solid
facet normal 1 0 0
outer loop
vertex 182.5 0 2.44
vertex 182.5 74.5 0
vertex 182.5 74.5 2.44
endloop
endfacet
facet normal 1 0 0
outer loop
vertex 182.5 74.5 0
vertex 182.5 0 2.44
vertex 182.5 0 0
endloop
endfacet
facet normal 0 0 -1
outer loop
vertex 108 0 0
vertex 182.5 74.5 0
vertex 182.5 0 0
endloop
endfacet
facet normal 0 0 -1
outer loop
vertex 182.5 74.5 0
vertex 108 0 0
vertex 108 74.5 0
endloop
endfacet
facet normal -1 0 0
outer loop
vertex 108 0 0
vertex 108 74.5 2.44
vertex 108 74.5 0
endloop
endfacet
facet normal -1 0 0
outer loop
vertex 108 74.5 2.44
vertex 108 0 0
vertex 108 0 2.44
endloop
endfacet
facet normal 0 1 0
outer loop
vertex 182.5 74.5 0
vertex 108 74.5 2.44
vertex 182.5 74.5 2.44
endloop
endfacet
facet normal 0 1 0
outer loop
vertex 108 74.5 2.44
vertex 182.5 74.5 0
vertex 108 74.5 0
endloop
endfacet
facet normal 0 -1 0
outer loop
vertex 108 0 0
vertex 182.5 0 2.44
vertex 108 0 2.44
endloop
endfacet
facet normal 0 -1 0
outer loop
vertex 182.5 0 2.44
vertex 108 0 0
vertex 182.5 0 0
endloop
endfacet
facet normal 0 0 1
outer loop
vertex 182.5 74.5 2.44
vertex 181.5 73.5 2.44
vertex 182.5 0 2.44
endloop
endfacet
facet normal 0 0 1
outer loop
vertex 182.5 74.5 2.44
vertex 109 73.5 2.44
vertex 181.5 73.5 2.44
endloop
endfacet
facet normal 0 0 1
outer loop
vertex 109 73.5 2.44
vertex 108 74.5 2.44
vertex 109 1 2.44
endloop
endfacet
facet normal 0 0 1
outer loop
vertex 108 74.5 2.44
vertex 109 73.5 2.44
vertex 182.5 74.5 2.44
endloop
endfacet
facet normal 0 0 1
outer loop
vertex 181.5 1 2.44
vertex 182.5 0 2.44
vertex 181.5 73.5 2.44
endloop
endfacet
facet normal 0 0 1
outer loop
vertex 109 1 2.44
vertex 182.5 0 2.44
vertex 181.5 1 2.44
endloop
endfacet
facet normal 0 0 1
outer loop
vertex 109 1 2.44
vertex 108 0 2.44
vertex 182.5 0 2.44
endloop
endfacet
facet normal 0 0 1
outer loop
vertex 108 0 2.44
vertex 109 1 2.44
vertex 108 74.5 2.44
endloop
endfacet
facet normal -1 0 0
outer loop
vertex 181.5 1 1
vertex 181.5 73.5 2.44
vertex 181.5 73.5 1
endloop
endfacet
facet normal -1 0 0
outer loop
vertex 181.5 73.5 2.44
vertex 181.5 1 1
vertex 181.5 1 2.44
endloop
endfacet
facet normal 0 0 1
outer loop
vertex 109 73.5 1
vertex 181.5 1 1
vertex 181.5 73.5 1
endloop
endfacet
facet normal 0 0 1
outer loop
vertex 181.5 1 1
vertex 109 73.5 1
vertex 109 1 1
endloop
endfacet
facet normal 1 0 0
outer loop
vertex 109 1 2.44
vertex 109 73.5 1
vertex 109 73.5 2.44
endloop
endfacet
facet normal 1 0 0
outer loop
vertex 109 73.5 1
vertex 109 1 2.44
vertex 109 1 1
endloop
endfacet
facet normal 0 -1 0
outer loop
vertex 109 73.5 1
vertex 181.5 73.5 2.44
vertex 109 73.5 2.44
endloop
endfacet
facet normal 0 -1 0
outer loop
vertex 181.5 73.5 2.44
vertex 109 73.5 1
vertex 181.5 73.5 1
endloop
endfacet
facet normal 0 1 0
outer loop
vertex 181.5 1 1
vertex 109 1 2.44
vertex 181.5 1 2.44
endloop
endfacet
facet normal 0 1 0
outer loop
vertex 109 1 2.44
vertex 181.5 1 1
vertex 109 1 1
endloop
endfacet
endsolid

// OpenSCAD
//include <lib/simple_box.scad>;
//x();
//i = 10;

////****MAIN SETTINGS****///////////////////////////////////////////////////////////////////////////
//////////////////////////////

//quality
$fn = 32;

create_lid = 1; //0 - don't create lid;   1 - create lid
create_body = 0; //0 - don't create body; 1 - create body

body_size_x = 72; //size of box in milimeters(openSCAD is unitless, so scale if needed)
body_size_y = 72; //internal space of the box will be: size - wall_thickness*2
body_size_z = 72;

wall_thickness = 1; //wall thickness in mm


roundness = 0; //roundness of the box in mm

//0 - sphere
//1 - z axis cylinder
//2 - x axis cylinder
//3 - y axis cylinder
roundness_type = 0;

//create latch flag
create_latches = 0;

////////////////////////////////////////////////////////////////////////////////////////////////////
////****INTERNAL SECTIONS****///////////////////////////////////////////////////////////////////////
////////////////////////////////////////////////////////////////////////////////////////////////////

internal_sections_thickness = 2; //internal sections thickness

internal_sections = [
                    //relative        | angle        | length  |relative |
                    //coordinates     | around z     | of the  | height  |
                    //of the middle   | (by default  | section |         |
                    //of the section  | sections are |         |         |
                    //                | alligned     |         |         |
                    //                | with x)      |         |         |
                    //  [ [0.5, 0.5],   90,             70,        1],
                    //  [ [0.7, 0.7],   10 ,             10,       0.5 ]
                    ];

////////////////////////////////////////////////////////////////////////////////////////////////////
////****ADVANCED SETTINGS****///////////////////////////////////////////////////////////////////////
////////////////////////////////////////////////////////////////////////////////////////////////////

//z size of the lid in relation to the body
lid_size_ratio = 0.02;

//horizontal gap between body and lid in mm
lid_gap = 0.50;

//box type 0 properties
body_roundness_reducer_multiplyer = 1;

//latch dimensions
latch_height = 0.5;
latch_width = 2;

////////////////////////////////////////////////////////////////////////////////////////////////////
////****PRE CALCULATIONS****/////////////////////////////////////////////////////////////////////////
////////////////////////////////////////////////////////////////////////////////////////////////////
body_internal_size_x = body_size_x - wall_thickness*2;
body_internal_size_y = body_size_y - wall_thickness*2;
body_internal_size_z = body_size_z - wall_thickness;

main_body_internal_center = [body_internal_size_x/2.0,
                             body_internal_size_y/2.0,
                             body_internal_size_z/2.0];
                             
lid_wall_height = body_size_z*lid_size_ratio;

lid_size_x = body_size_x + wall_thickness*2 + lid_gap;
lid_size_y = body_size_y + wall_thickness*2 + lid_gap;
lid_size_z = lid_wall_height + roundness + wall_thickness;

//latch
body_latch_z = body_size_z - (lid_wall_height)/2.0 + latch_width/4.0;
body_latch_x = (body_size_x- roundness*2)/2.0;
body_latch_y = (body_size_y- roundness*2)/2.0;

lid_latch_z = (roundness + wall_thickness) + (lid_wall_height)/2.0 + latch_width/4.0;
lid_latch_x = body_latch_x;
lid_latch_y = body_latch_y;
////////////////////////////////////////////////////////////////////////////////////////////////////
////****SPACES****//////////////////////////////////////////////////////////////////////////////////
////////////////////////////////////////////////////////////////////////////////////////////////////

module main_body_space(){
    translate([wall_thickness+lid_gap, wall_thickness+lid_gap, 0]){
        children();
    }
}

module lid_space(){
    translate([(body_size_x)*1.5, 0, 0]){
        children();
    }
}

module main_body_internal_space(){
    main_body_space(){
        translate([wall_thickness, wall_thickness, wall_thickness]){
            children();
        }
    }
}

////////////////////////////////////////////////////////////////////////////////////////////////////
////****MODULES****/////////////////////////////////////////////////////////////////////////////////
////////////////////////////////////////////////////////////////////////////////////////////////////

//creating latch
module latch(_position, _length, _orientation){
    translate(_position){
        rotate(a = _orientation, v = [0, 0, 1]){
            translate([-_length/2.0, 0, 0]){
                translate([0, 0, -latch_width/2.0]){
                    rotate(a = 180, v = [1,0,0]){
                        rotate(a = 90, v = [0,1,0]){
                            linear_extrude(height = _length) polygon([[0, 0], [latch_width, 0], [latch_width/2.0, latch_height]]);
                        }
                    }
                }
            }
        }
   }

}

//body cube with roundness
module rounded_cube(_x, _y, _z, _r){
    translate([_r, _r, _r]){
        minkowski(){
            cube([_x-_r*2,
                  _y-_r*2,
                  _z-_r*2]);
            roundness_object();
        }
    }
}

module inverse_rounded_cube(_x, _y, _z, _r, _multiplier = 15){
    difference(){
        cube(_x*_multiplier, _y*_multiplier, _z*_multiplier, center = true);
        rounded_cube(_x, _y, _z, _r);
    }
}

module top_cut(_x, _y, _z){
    translate([0, 0, _z]){
        __z_size = _z*2;
        translate ([0,0, (__z_size)/2]) cube([_x*3, _y*3, __z_size], center=true);
    }
}

module internal_sections(){
    for (__s = internal_sections){
        if (__s[0] != undef){
            __section_length = __s[2];
            __section_width = internal_sections_thickness;
            __section_height = body_internal_size_z*__s[3];
            difference(){
                __section_center = [__section_length/2.0, __section_width/2.0];
                translate([body_internal_size_x*__s[0][0],
                           body_internal_size_y*__s[0][1],
                           0] - __section_center){
                    translate([__section_center.x, __section_center.y, __section_height/2.0]){
                        rotate(a = __s[1], v = [0,0,1]){
                            cube([__section_length, __section_width, __section_height], center = true);
                        }
                    }
                }
                union(){
                    top_cut(body_size_x, body_size_y, body_size_z);
                    inverse_rounded_cube(body_internal_size_x,
                                         body_internal_size_y,
                                         body_internal_size_z*1.1+roundness, roundness);
                }
            }
        }
    }
}

module roundness_object(){
    if (roundness_type == 0){
        sphere(roundness);
    }
    else if (roundness_type == 1){
        cylinder(h = roundness*2, r = roundness, center = true);
    }
    else if (roundness_type == 2){
        rotate(a = 90, v = [1,0,0]){
            cylinder(h = roundness*2, r = roundness, center = true);
        }
    }
    else if (roundness_type == 3){
        rotate(a = 90, v = [0,1,0]){
            cylinder(h = roundness*2, r = roundness, center = true);
        }
    }
}

module cup(_x, _y, _z){
    difference(){
        difference(){
           rounded_cube(_x, _y, _z*1.1+roundness, roundness);
           top_cut(_x, _y, _z);
        }
        //inside cut
        translate([wall_thickness, wall_thickness, wall_thickness]){
           rounded_cube(_x - wall_thickness*2, _y - wall_thickness*2, _z*1.1+roundness, roundness);
        }
    }
}

////////////////////////////////////////////////////////////////////////////////////////////////////
////****EXECUTION PART****/////////////////////////////////////////////////////////////////////////////////
////////////////////////////////////////////////////////////////////////////////////////////////////

if (create_body){
    //body
    main_body_space() {
        cup(body_size_x, body_size_y, body_size_z);
    }

    main_body_internal_space(){
        internal_sections(internal_sections);
    }

//body latches

//body 
//0,y/2 latch

    main_body_space(){
            latch([0, body_size_y/2.0, body_latch_z], body_latch_x, 270);
    }

    if (create_latches){
        //x/2,0 latch
        main_body_space(){
                latch([body_size_x/2.0, 0, body_latch_z], body_latch_x, 0);
        }

        //x/2,y latch
        main_body_space(){
                latch([body_size_x/2.0, body_size_y, body_latch_z], body_latch_x, 180);
        }

        //x,y/2 latch
        main_body_space(){
                latch([body_size_x, body_size_y/2.0, body_latch_z], body_latch_x, 90);
        }
        
    }
}

//lid
if (create_lid==1){
    
    lid_space(){
        cup(lid_size_x, lid_size_y, lid_size_z);
    }
    
    //lid latches
    if (create_latches){
        //0,y/2 latch
        lid_space(){
            latch([0 + wall_thickness, body_size_y/2.0, lid_latch_z], lid_latch_x, 90);
        }
        
        //x/2,0 latch
        lid_space(){
            latch([lid_size_x/2.0, wall_thickness, lid_latch_z], lid_latch_x, 180);
        }
        
        //x/2,y latch
        lid_space(){
            latch([lid_size_x/2.0, lid_size_y - wall_thickness, lid_latch_z], body_latch_x, 0);
        }
        
        //x,y/2 latch
        lid_space(){
            latch([lid_size_x - wall_thickness, lid_size_y/2.0, lid_latch_z], lid_latch_x, 270);
        }
    }
    
}


test = [0,1,2,3];
echo(test[0]);
